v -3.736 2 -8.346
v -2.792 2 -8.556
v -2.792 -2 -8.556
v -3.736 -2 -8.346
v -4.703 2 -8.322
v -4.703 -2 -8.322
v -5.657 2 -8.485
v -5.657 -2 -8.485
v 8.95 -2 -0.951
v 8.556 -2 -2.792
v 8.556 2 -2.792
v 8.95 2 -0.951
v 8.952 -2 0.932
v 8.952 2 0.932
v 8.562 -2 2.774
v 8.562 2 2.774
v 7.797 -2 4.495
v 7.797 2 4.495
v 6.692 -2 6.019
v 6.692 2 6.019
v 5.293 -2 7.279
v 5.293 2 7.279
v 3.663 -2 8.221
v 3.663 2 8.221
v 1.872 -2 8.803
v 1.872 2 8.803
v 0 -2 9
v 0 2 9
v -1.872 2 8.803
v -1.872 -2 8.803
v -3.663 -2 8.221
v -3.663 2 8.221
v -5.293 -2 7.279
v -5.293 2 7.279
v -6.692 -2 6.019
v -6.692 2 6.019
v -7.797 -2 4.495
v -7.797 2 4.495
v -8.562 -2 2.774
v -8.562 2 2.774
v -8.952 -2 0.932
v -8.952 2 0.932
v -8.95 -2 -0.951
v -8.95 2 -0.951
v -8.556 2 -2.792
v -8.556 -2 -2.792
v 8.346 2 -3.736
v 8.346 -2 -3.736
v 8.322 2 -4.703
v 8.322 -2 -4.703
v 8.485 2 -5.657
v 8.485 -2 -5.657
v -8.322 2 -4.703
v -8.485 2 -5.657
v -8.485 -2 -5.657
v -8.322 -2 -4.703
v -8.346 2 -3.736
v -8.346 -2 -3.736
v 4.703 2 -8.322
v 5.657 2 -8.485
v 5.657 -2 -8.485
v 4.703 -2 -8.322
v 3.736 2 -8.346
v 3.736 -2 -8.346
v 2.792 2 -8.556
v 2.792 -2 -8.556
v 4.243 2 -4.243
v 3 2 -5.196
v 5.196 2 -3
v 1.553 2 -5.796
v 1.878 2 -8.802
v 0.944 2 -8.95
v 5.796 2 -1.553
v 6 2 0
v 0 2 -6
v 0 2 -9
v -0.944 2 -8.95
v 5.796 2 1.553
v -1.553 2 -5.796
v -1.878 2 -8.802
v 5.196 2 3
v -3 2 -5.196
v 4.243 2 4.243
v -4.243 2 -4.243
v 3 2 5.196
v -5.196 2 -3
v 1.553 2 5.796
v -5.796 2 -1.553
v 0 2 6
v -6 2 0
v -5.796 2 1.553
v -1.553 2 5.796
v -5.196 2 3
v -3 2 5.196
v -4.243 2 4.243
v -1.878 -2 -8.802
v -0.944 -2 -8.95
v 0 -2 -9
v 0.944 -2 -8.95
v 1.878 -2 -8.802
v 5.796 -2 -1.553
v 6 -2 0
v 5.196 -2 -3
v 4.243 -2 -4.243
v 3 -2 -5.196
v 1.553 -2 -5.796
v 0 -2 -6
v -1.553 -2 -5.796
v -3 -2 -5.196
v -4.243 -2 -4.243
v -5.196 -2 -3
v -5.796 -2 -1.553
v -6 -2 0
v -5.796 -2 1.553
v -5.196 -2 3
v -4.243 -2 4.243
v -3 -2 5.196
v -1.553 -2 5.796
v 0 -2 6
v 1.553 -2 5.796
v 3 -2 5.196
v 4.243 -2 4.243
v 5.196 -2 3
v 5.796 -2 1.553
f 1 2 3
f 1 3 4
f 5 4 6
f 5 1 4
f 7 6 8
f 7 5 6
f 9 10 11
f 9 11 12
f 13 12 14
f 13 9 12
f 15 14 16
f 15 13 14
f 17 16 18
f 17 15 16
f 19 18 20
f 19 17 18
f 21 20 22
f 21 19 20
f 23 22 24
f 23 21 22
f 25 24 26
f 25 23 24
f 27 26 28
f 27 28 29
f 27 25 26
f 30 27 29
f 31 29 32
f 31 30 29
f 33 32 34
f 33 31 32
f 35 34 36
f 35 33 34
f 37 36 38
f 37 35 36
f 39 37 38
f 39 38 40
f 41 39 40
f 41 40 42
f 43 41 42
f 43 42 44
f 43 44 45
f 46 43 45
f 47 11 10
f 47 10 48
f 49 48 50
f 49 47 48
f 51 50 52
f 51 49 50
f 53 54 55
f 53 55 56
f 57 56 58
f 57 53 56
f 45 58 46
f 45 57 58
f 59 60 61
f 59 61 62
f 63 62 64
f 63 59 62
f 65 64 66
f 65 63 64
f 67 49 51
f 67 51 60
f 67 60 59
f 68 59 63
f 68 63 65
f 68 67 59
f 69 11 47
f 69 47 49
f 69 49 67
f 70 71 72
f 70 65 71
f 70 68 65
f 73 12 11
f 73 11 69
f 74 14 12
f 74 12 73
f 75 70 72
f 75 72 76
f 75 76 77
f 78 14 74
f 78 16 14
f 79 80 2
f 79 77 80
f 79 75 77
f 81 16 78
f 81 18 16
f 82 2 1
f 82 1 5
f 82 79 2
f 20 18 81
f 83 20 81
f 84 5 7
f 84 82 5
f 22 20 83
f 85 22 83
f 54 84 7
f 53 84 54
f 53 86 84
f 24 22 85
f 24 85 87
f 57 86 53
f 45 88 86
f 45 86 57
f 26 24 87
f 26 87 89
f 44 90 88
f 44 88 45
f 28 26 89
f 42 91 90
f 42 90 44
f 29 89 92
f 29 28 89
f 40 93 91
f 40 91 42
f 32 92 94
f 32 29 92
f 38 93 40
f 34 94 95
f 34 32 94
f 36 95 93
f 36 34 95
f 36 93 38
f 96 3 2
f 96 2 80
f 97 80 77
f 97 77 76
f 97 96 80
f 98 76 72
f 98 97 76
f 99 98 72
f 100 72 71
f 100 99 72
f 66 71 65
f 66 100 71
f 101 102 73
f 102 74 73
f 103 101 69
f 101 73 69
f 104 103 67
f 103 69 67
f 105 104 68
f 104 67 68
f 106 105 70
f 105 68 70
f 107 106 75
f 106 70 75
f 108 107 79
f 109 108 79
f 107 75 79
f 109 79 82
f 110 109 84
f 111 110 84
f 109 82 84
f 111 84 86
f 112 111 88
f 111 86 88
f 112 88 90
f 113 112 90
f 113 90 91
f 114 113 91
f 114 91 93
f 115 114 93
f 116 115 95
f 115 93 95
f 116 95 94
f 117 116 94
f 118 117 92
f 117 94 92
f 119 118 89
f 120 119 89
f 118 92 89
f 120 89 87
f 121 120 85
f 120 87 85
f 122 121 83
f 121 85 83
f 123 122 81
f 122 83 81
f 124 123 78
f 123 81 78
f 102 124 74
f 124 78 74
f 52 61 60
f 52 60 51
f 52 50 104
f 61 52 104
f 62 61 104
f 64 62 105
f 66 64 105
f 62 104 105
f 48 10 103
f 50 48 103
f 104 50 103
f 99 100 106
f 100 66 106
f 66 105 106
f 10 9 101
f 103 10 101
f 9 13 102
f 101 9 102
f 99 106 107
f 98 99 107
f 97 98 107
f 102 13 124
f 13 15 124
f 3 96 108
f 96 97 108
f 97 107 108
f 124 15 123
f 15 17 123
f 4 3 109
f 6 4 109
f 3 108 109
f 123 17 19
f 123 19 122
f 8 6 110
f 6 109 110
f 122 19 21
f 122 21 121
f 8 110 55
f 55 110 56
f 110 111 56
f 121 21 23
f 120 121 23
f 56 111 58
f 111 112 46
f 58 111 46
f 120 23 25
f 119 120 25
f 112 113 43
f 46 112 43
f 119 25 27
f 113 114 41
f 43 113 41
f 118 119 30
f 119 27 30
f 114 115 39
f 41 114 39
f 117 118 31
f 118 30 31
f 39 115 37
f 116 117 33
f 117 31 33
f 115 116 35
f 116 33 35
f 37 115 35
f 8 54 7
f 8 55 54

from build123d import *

# Parameters (mm, degrees)
F1_DEPTH    = 2
F2_T1_DEPTH = 4


# Not quite as in the source:
# - a fillet or chamfer that OpenCascade refuses, or shapes differently, is made with other operations: its cross-section is extruded or revolved along the edge and cut away or added


with BuildPart() as f1:
    # F0 (on Front) → F1 (new body, symmetric)
    with BuildSketch(Plane.XZ):
        with BuildLine():
            ThreePointArc((-4.7906232606, -7.6190503854), (-2.4928444127, -8.6478741165), (0, -9))
            ThreePointArc((0, -9), (2.4928444127, -8.6478741165), (4.7906232606, -7.6190503854))
            Line((4.7906232606, -7.6190503854), (5.6568542495, -8.4852813742))
            Line((5.6568542495, -8.4852813742), (8.4852813742, -5.6568542495))
            Line((8.4852813742, -5.6568542495), (7.6190503854, -4.7906232606))
            ThreePointArc((7.6190503854, -4.7906232606), (0, 9), (-7.6190503854, -4.7906232606))
            Line((-7.6190503854, -4.7906232606), (-8.4852813742, -5.6568542495))
            Line((-8.4852813742, -5.6568542495), (-5.6568542495, -8.4852813742))
            Line((-5.6568542495, -8.4852813742), (-4.7906232606, -7.6190503854))
        make_face()
        with BuildLine():
            ThreePointArc((0, -6), (-4.2426406871, 4.2426406871), (6, 0))
            ThreePointArc((6, 0), (4.2426406871, -4.2426406871), (0, -6))
        make_face(mode=Mode.SUBTRACT)
    extrude(amount=F1_DEPTH, both=True)

    # F2: fillet of radius 5 on 4 edges, made by hand

    # F2_s2 → F2_t1 (join)
    with BuildSketch(Plane.XZ.offset(-2)):
        with BuildLine():
            ThreePointArc((8.5560838448, -2.7916714064), (8.3109896839, -4.2190810375), (8.4852813742, -5.6568542495))
            Line((8.4852813742, -5.6568542495), (7.6190503854, -4.7906232606))
            ThreePointArc((7.6190503854, -4.7906232606), (8.149091604, -3.8199877003), (8.5560838448, -2.7916714064))
        make_face()
        with BuildLine():
            ThreePointArc((5.6568542495, -8.4852813742), (4.2190810375, -8.3109896839), (2.7916714064, -8.5560838448))
            ThreePointArc((2.7916714064, -8.5560838448), (3.8199877003, -8.149091604), (4.7906232606, -7.6190503854))
            Line((4.7906232606, -7.6190503854), (5.6568542495, -8.4852813742))
        make_face()
        with BuildLine():
            ThreePointArc((-2.7916714064, -8.5560838448), (-4.2190810375, -8.3109896839), (-5.6568542495, -8.4852813742))
            Line((-5.6568542495, -8.4852813742), (-4.7906232606, -7.6190503854))
            ThreePointArc((-4.7906232606, -7.6190503854), (-3.8199877003, -8.149091604), (-2.7916714064, -8.5560838448))
        make_face()
        with BuildLine():
            ThreePointArc((-8.4852813742, -5.6568542495), (-8.3109896839, -4.2190810375), (-8.5560838448, -2.7916714064))
            ThreePointArc((-8.5560838448, -2.7916714064), (-8.149091604, -3.8199877003), (-7.6190503854, -4.7906232606))
            Line((-7.6190503854, -4.7906232606), (-8.4852813742, -5.6568542495))
        make_face()
    extrude(amount=F2_T1_DEPTH)


solid = f1.part
